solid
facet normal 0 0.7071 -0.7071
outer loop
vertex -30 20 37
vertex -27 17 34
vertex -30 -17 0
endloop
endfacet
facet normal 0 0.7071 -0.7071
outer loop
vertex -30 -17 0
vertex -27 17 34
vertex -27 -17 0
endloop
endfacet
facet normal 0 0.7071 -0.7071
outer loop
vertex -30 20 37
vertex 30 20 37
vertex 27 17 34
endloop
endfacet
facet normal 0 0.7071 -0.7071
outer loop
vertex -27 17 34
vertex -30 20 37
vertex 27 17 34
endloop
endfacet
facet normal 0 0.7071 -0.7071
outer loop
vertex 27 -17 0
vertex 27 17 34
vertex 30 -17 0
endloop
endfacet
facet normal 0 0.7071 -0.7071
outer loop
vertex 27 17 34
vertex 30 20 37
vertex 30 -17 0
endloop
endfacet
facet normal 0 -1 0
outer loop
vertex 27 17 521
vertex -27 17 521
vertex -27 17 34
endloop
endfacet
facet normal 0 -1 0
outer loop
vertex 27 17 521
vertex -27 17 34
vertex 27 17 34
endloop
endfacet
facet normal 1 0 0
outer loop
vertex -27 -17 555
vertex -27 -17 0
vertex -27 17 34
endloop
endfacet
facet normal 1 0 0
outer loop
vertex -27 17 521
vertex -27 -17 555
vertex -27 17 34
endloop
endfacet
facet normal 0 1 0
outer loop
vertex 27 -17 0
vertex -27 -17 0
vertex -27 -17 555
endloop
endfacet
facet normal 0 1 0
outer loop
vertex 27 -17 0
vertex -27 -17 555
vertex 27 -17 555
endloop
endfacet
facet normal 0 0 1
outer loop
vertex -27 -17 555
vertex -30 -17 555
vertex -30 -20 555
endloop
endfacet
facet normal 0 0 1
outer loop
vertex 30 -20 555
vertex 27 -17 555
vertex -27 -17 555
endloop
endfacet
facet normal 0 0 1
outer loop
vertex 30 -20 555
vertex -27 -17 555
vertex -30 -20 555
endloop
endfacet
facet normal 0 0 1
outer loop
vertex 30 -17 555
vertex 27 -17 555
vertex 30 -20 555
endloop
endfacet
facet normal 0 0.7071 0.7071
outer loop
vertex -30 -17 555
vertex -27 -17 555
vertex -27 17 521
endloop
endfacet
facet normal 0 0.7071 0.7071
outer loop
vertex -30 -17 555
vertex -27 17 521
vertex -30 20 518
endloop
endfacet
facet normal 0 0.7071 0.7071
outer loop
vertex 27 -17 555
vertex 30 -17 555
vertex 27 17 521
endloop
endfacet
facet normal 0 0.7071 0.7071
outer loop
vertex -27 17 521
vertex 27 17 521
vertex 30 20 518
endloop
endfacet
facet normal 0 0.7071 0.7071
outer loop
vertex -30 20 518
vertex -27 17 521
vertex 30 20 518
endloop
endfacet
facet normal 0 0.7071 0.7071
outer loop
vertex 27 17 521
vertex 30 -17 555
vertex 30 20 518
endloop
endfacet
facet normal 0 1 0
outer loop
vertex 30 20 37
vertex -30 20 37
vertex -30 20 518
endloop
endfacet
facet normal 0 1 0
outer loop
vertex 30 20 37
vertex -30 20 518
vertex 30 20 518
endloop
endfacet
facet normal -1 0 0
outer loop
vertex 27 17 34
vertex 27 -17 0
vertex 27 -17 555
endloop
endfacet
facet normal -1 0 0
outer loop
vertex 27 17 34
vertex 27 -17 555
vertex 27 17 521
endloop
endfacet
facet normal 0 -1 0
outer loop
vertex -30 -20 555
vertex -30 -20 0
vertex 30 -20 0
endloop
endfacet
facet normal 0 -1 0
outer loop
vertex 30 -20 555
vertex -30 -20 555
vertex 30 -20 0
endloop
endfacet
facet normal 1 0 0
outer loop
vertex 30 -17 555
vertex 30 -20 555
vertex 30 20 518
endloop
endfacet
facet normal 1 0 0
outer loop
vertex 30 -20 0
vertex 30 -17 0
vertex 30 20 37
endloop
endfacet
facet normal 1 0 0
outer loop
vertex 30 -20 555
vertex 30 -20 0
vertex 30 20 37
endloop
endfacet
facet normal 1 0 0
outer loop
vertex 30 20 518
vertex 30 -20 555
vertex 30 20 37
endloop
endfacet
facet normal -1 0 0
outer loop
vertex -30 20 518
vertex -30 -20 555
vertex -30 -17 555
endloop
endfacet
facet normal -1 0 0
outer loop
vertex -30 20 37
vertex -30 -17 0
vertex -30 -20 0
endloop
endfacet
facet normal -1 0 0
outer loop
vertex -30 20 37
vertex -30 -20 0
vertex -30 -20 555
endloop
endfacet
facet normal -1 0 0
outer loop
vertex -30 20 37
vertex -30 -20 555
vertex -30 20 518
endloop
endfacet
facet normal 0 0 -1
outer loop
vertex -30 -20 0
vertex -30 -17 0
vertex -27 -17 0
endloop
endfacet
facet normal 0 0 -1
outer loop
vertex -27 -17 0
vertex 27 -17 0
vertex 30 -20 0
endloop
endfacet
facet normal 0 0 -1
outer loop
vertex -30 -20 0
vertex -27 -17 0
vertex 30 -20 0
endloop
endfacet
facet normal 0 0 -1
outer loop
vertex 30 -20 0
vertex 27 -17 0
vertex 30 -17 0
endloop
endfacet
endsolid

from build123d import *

# Parameters (mm, degrees)
F0_W     = 60
F0_H     = 40
F0_W_2   = 54
F0_H_2   = 34
F1_DEPTH = 555
F3_DEPTH = 60
F4_DEPTH = 60


with BuildPart() as f1:
    # F0 (on Top) → F1 (new body)
    with BuildSketch(Plane.XY):
        Rectangle(F0_W, F0_H)
        Rectangle(F0_W_2, F0_H_2, mode=Mode.SUBTRACT)
    extrude(amount=F1_DEPTH)

    # F2 (on face) → F3 (cut)
    with BuildSketch(Plane.YZ.offset(30)):
        Polygon((20, 555), (-17, 555), (20, 518), align=None)
        Polygon((-17, 0), (20, 0), (20, 37), align=None)
    extrude(amount=-F3_DEPTH, mode=Mode.SUBTRACT)

    # F2 (on face) → F4 (cut)
    with BuildSketch(Plane.YZ.offset(30)):
        Polygon((20, 0), (20, 37), (-17, 0), align=None)
    extrude(amount=-F4_DEPTH, mode=Mode.SUBTRACT)


solid = f1.part
